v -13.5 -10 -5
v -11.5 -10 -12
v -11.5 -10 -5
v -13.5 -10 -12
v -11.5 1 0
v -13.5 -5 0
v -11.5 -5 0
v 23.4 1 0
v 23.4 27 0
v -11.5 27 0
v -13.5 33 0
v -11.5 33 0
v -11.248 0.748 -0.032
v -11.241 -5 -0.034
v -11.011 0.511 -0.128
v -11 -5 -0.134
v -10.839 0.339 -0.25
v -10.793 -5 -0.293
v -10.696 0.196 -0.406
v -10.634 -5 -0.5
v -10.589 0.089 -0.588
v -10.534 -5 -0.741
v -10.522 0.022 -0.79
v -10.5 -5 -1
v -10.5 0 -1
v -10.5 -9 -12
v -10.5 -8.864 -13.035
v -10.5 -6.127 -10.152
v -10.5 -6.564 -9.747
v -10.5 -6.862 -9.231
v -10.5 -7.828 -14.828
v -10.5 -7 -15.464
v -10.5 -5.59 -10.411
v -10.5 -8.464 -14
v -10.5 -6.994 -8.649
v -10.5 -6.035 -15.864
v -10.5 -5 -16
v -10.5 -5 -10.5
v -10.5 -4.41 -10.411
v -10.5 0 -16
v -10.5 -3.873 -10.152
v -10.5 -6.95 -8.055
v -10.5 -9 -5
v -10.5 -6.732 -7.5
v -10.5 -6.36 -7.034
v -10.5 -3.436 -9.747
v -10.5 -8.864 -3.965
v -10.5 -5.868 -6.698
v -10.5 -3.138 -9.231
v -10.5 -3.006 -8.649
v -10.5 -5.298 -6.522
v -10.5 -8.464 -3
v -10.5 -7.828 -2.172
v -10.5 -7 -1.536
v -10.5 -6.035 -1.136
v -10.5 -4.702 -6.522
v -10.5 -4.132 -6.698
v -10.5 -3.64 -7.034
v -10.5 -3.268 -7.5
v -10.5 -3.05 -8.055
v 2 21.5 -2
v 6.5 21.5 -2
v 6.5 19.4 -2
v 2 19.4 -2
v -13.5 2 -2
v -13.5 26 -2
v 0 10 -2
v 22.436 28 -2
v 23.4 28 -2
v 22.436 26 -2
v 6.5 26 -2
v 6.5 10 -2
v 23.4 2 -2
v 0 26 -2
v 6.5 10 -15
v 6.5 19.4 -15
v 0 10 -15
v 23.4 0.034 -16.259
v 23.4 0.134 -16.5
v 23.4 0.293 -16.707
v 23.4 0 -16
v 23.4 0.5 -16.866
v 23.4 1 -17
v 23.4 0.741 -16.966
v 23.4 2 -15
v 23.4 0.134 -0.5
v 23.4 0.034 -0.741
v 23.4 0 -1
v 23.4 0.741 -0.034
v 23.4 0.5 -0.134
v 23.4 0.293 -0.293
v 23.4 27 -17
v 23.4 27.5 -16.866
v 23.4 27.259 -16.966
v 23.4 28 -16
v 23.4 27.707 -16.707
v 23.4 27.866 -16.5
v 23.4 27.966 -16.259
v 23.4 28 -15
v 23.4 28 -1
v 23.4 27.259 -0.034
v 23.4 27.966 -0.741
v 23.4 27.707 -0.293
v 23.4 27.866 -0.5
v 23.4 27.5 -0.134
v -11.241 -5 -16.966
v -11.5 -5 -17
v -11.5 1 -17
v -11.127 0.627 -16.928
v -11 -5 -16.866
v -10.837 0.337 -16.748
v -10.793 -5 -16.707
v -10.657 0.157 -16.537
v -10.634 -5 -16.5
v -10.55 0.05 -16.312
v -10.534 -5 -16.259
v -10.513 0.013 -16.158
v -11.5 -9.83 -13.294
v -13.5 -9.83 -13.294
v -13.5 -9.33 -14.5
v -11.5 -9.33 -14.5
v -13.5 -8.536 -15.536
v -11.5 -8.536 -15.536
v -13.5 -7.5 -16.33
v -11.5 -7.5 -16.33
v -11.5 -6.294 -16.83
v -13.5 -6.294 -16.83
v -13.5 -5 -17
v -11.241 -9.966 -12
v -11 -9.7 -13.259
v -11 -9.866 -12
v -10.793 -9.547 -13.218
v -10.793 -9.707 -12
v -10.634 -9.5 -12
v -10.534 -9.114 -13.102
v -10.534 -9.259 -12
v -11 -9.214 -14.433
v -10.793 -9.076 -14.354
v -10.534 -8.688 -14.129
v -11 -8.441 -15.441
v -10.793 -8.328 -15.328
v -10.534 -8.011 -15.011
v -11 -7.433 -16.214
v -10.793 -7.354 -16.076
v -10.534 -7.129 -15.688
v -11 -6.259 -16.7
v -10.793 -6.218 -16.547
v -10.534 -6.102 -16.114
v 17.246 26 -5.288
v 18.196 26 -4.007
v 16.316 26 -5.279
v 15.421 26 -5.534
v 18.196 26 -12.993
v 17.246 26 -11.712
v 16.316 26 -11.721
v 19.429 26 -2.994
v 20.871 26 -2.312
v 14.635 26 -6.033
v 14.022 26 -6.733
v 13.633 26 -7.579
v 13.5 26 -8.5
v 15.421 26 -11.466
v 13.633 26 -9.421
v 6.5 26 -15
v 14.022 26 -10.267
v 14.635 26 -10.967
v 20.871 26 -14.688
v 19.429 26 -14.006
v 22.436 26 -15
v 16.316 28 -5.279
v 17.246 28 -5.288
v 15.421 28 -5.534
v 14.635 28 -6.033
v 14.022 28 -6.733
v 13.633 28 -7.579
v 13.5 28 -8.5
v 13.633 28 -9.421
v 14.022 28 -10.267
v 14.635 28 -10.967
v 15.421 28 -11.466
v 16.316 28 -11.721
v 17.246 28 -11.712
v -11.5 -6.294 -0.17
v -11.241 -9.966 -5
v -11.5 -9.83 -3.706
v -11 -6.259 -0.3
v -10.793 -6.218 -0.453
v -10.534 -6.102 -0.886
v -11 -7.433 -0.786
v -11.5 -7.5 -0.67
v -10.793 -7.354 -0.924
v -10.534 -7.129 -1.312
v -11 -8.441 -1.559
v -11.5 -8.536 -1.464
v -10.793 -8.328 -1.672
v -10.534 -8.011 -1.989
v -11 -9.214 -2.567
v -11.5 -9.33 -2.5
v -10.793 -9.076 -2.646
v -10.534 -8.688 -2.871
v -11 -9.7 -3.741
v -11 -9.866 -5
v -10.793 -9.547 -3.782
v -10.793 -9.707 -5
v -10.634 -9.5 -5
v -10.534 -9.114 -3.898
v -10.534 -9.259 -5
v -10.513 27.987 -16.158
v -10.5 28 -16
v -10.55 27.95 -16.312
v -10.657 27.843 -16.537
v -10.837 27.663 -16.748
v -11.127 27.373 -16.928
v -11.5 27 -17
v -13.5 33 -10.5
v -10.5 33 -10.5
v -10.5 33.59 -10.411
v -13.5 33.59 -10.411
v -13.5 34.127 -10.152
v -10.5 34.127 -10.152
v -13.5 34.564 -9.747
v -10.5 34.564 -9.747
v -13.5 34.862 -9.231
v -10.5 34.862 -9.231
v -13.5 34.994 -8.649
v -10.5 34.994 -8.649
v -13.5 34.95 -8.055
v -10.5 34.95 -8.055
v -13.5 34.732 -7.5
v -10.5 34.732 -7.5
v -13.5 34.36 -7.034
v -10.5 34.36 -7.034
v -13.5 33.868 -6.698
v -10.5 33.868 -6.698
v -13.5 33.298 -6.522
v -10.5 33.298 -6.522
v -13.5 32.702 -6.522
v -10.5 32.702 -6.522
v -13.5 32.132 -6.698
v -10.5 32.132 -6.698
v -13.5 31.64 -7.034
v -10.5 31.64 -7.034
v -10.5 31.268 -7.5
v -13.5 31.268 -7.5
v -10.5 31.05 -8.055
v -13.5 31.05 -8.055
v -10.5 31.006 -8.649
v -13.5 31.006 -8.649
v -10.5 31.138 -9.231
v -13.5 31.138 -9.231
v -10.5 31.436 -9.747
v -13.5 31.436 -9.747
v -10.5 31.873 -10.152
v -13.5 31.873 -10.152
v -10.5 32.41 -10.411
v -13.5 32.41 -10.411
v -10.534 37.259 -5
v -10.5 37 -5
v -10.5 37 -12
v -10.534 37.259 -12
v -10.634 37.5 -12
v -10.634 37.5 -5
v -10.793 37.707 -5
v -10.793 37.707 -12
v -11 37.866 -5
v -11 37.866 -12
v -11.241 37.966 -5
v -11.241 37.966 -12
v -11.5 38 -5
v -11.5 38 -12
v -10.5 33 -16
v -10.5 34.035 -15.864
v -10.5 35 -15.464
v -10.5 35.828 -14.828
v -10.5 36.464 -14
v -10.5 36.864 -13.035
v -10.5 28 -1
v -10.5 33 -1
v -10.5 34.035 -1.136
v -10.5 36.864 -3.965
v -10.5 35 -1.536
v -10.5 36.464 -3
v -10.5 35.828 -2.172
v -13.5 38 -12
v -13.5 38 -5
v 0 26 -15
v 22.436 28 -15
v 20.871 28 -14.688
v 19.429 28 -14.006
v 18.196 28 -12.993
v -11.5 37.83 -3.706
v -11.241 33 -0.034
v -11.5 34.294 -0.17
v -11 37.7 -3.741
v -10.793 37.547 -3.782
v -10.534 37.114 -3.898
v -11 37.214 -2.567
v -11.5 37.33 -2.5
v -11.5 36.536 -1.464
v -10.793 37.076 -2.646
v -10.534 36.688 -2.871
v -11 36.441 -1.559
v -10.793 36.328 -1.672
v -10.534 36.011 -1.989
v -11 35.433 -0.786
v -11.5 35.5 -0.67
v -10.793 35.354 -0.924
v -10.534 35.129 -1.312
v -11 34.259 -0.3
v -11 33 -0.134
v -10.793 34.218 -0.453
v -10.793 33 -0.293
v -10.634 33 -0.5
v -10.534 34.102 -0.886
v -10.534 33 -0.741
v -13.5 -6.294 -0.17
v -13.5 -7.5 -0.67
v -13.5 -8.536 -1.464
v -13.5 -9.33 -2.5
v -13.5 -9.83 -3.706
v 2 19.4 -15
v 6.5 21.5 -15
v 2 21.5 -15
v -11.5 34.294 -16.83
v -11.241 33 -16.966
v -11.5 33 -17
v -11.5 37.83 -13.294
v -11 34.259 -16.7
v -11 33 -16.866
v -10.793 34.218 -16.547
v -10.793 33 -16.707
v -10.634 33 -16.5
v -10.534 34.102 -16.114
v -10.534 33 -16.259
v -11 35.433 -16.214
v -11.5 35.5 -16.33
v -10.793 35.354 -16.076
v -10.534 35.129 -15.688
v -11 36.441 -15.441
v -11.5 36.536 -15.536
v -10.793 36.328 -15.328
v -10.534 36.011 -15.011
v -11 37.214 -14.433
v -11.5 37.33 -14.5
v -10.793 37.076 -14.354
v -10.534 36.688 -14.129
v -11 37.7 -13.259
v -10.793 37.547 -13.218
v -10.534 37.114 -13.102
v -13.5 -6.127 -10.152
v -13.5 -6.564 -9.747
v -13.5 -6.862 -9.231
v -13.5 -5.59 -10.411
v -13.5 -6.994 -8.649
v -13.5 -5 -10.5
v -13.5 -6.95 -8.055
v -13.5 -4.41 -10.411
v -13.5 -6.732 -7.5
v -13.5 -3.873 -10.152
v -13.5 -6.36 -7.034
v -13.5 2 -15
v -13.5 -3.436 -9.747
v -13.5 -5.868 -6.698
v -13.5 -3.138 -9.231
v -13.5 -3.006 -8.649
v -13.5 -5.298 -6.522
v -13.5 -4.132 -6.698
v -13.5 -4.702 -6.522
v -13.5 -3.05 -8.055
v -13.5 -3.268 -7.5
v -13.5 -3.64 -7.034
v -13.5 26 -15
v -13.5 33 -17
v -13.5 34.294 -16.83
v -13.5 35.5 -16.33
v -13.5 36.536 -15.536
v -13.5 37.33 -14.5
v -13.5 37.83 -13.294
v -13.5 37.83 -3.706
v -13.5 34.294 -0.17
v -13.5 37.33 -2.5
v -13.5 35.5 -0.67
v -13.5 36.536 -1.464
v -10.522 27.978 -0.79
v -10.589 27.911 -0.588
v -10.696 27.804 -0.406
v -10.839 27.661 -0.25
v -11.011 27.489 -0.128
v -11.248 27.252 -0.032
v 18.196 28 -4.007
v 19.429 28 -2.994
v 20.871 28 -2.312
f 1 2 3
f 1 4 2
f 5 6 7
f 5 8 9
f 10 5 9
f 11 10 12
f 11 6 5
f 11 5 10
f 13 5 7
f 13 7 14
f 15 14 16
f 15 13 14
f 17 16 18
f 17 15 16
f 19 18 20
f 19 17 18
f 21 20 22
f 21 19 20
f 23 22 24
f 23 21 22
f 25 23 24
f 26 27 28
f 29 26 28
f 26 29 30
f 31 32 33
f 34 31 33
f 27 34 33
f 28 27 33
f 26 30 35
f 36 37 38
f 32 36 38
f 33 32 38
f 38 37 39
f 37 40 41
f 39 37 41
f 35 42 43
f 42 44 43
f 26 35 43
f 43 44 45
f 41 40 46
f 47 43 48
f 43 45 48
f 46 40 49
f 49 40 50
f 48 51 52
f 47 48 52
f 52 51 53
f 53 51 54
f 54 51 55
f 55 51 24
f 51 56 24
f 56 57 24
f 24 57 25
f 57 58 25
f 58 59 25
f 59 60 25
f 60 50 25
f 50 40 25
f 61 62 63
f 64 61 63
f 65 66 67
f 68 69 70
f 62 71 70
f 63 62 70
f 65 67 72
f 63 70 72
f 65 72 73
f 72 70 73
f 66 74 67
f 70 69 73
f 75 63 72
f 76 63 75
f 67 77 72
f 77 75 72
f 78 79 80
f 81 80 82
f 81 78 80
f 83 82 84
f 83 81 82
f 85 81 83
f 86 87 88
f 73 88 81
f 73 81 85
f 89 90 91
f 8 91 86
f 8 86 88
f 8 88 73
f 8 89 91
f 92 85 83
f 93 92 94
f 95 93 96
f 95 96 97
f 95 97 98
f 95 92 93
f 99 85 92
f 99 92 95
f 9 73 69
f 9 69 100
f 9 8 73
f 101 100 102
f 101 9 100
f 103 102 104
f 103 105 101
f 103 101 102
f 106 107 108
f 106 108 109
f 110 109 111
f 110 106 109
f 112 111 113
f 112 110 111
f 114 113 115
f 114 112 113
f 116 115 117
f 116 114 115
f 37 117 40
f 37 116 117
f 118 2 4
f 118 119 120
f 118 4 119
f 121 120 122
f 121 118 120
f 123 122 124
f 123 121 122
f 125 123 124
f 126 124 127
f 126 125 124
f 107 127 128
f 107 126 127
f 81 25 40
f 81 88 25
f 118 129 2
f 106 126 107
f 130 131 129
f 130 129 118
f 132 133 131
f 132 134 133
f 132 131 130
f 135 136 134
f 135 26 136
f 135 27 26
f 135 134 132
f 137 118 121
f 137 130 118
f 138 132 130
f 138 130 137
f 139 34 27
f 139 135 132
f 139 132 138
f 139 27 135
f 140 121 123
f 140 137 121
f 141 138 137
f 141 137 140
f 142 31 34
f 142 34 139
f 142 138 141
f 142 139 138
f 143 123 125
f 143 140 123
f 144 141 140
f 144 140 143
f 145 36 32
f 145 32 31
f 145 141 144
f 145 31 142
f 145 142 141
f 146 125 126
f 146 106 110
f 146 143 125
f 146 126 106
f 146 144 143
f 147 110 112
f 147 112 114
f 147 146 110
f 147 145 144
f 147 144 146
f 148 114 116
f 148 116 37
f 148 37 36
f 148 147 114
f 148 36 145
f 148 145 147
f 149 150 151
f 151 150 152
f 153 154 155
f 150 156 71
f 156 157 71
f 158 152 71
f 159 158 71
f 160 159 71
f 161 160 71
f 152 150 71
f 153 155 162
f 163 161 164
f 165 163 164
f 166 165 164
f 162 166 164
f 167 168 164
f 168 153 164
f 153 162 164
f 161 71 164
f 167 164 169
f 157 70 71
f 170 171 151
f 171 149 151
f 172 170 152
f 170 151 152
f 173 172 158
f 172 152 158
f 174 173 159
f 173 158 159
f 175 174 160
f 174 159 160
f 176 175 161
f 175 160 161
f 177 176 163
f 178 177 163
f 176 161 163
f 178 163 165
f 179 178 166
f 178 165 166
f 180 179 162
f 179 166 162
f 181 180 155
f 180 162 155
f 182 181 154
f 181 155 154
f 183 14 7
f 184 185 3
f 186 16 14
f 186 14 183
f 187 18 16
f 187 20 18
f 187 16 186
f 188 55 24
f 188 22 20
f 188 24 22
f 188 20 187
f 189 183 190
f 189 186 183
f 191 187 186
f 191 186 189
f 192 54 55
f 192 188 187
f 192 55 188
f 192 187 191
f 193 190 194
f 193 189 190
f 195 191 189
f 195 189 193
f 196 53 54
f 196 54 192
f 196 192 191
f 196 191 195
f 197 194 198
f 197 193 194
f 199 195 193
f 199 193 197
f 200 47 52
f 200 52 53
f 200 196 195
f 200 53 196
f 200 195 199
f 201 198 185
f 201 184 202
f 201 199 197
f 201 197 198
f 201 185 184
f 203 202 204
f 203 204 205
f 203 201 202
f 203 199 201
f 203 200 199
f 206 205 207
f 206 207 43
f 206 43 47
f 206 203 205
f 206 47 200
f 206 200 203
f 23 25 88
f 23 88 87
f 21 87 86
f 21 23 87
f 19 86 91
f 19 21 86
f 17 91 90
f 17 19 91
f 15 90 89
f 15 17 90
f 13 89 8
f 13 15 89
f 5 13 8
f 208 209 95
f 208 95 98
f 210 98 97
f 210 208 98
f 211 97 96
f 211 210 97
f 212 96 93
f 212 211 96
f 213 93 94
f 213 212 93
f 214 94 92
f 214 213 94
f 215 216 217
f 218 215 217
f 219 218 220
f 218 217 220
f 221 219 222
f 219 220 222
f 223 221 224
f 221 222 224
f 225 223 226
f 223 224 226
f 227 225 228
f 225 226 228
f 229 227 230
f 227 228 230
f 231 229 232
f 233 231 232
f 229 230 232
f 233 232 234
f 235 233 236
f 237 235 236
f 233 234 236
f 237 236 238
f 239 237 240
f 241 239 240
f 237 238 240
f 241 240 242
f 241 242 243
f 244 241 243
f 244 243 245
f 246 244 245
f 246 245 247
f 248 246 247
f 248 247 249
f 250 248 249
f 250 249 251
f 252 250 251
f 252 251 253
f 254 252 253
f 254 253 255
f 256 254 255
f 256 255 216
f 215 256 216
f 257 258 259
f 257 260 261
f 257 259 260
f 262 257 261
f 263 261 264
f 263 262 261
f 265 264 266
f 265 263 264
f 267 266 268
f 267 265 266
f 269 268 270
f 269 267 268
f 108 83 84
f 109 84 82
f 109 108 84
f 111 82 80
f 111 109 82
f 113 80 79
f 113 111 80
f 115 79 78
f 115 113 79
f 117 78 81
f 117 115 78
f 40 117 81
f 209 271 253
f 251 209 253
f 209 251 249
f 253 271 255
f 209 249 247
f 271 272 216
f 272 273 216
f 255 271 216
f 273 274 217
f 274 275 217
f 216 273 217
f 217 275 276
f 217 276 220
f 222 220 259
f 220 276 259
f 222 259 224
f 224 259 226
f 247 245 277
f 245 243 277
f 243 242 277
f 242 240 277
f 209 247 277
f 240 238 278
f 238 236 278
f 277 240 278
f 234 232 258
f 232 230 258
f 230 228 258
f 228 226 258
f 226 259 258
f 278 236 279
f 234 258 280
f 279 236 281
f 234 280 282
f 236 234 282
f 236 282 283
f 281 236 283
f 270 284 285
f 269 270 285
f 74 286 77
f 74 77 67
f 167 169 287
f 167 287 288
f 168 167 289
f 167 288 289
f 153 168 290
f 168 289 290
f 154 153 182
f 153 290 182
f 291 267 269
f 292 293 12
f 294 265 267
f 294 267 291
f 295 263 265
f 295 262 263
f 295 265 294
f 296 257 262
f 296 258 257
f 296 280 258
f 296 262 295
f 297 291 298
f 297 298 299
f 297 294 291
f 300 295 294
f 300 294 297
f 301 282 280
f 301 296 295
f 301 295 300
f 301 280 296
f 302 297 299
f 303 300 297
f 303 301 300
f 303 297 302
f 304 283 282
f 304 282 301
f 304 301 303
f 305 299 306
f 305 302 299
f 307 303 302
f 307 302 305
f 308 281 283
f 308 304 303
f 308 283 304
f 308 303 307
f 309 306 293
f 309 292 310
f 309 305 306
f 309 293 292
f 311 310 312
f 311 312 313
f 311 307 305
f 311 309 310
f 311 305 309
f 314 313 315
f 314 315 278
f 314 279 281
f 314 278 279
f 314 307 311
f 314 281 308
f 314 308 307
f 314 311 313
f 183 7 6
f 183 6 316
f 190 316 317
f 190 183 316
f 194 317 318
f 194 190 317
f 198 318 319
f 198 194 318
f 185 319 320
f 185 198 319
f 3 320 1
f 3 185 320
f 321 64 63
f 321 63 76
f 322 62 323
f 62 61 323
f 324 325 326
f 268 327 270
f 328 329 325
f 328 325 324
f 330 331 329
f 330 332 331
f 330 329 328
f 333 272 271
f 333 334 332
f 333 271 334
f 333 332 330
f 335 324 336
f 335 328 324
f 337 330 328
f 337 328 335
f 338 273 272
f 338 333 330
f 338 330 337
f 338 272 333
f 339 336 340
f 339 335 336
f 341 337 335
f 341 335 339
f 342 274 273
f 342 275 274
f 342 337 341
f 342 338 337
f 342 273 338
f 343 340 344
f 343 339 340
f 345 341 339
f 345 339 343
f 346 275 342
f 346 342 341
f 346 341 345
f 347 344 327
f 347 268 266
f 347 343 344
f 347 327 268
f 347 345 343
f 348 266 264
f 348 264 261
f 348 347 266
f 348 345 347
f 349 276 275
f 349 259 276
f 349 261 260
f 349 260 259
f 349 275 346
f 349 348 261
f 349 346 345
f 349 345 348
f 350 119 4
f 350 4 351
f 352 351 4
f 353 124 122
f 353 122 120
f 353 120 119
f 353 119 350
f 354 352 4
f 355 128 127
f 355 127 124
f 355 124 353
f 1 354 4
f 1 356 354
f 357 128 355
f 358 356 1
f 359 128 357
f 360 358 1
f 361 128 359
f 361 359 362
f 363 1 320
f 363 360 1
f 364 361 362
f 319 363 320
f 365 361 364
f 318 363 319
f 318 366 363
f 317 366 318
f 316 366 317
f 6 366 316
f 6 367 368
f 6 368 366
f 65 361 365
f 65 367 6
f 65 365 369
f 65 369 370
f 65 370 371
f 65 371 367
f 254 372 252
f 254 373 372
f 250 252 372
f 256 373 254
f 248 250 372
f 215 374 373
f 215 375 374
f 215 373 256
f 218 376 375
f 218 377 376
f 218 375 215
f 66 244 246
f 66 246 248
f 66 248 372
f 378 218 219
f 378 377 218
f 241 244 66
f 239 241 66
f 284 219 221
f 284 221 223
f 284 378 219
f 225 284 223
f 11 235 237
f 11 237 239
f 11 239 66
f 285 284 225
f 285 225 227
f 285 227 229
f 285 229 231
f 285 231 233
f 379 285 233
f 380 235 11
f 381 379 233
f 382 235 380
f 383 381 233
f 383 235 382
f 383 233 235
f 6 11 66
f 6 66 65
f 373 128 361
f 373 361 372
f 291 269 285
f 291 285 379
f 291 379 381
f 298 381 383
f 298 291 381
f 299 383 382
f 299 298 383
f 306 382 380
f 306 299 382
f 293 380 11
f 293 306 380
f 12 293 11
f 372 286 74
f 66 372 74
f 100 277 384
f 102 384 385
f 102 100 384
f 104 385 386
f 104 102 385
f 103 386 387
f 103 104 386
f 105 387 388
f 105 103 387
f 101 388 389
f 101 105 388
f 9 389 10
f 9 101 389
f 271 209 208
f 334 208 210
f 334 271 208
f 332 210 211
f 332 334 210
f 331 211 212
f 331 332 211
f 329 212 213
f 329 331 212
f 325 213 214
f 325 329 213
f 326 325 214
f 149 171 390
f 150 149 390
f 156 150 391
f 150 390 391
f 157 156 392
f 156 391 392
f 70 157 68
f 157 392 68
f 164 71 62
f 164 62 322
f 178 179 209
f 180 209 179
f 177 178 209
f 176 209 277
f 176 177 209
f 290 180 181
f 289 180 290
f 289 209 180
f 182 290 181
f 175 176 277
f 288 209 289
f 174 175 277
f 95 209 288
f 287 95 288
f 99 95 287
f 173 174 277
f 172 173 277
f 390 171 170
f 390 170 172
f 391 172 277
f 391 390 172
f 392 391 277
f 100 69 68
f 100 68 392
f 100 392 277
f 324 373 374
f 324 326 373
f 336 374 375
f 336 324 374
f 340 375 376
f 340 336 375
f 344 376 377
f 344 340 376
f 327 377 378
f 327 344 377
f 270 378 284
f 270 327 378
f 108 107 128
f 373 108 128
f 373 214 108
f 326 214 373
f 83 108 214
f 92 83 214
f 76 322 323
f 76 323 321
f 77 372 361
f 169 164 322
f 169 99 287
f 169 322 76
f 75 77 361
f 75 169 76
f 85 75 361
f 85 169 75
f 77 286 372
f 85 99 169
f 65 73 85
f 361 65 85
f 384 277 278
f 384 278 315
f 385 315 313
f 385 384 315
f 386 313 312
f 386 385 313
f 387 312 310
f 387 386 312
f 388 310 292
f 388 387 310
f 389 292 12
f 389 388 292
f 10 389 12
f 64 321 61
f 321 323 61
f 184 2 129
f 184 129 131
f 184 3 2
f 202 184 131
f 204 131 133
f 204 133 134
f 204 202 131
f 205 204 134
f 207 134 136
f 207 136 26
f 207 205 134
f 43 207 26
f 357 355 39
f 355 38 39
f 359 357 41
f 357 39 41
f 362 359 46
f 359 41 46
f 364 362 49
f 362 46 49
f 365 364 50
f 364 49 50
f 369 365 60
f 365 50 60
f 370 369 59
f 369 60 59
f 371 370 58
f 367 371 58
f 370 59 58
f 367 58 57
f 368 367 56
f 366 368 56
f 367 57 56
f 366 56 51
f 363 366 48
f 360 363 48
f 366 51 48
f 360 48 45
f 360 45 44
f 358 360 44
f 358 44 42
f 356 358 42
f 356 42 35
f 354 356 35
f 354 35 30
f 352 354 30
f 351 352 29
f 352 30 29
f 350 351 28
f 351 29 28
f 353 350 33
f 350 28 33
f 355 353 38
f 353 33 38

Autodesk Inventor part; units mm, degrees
ref_plane "YZ Plane" through (0, 0, 0) normal (1, 0, 0) x (0, 1, 0)
ref_plane "XZ Plane" through (0, 0, 0) normal (0, 1, 0) x (-1, 0, 0)
ref_plane "XY Plane" through (0, 0, 0) normal (0, 0, 1) x (1, 0, 0)
sketch "Esquisse5" plane through (0, 0, 0) normal (1, 0, 0) x (0, 1, 0)
  line L0 (0, 0) -> (28, 0)
  line L1 (28, 0) -> (28, -17)
  line L2 (28, -17) -> (0, -17)
  line L3 (0, -17) -> (0, 0)
  line L4 (0, 0) -> (0, -2)
  line L5 (0, -2) -> (2, -2)
  line L6 (28, -17) -> (28, -15)
  line L7 (28, -15) -> (26, -15)
  line L8 (26, -15) -> (2, -15)
  line L9 (2, -15) -> (2, -2)
  line L10 (2, -2) -> (26, -2)
  line L11 (26, -2) -> (26, -15)
  dimension "d20" = 28
  dimension "d21" = 17
  dimension "d22" = 2
  dimension "d23" = 2
  dimension "d24" = 2
  dimension "d25" = 2
extrude "Extrusion4" add sketch "Esquisse5" along normal blind 23.4 contours L0 L1 L7 L11 L10 L5 L3 | L5 L9 L8 L7 L1 L2 L3
sketch "Esquisse6" plane through (0, 0, 0) normal (-1, 0, 0) x (0, 0, 1)
  line L0 (-15, 2) -> (-2, 2) projected
  line L1 (-2, 2) -> (-2, 26) projected
  line L2 (-15, 2) -> (-2, 2)
  line L3 (-2, 2) -> (-2, 26)
  line L4 (-2, 26) -> (-15, 26)
  line L5 (-15, 26) -> (-15, 2)
  point P0 (0, 0)
extrude "Extrusion5" add sketch "Esquisse6" against normal blind 2
sketch "Esquisse7" plane through (2, 0, 0) normal (1, 0, 0) x (0, 0, -1)
  line L0 (15, 2) -> (2, 2)
  line L1 (2, 2) -> (2, 19.4)
  line L2 (2, 2) -> (2, 26)
  line L3 (2, 19.4) -> (2, 21.5)
  line L4 (2, 21.5) -> (2, 26)
  line L5 (2, 21.5) -> (2, 26)
  line L6 (15, 2) -> (2, 2)
  line L7 (2, 2) -> (2, 19.4)
  line L8 (2, 19.4) -> (15, 19.4)
  line L9 (15, 19.4) -> (15, 2)
  line L10 (2, 26) -> (15, 26)
  line L11 (15, 26) -> (2, 26)
  line L12 (2, 26) -> (2, 21.5)
  line L13 (2, 21.5) -> (15, 21.5)
  line L14 (15, 21.5) -> (15, 26)
  point P0 (0, 0)
  dimension "d30" = 17.4
  dimension "d31" = 2.1
extrude "Extrusion6" add sketch "Esquisse7" along normal blind 4.5
sketch "Esquisse8" plane through (6.5, 0, 0) normal (1, 0, 0) x (0, 0, -1)
  line L0 (15, 26) -> (15, 2) projected
  line L1 (2, 2) -> (15, 2)
  line L2 (15, 2) -> (15, 10)
  line L3 (15, 10) -> (2, 10)
  line L4 (2, 10) -> (2, 2)
  point P0 (0, 0)
  dimension "d34" = 8
extrude "Extrusion7" cut sketch "Esquisse8" against normal up to next
sketch "Esquisse9" plane through (0, 28, 0) normal (0, 1, 0) x (1, 0, 0)
  line L0 (22.4357, 15) -> (23.4, 15)
  line L1 (22.4357, 2) -> (23.4, 2)
  arc A0 (23.4, 15) -> (23.4, 2) centre (22.9179, 8.5) ccw
  line L2 (23.4, 2) -> (23.4, 15)
  line L3 (23.4, 15) -> (23.4, 2)
  line L4 (23.4, 2) -> (23.4, 15) projected
  line L5 (23.4, 0) -> (23.4, 2)
  point P0 (0, 0)
extrude "Extrusion8" cut sketch "Esquisse9" against normal blind 4.5 contours L0 L2 L1 A0
sketch "Esquisse10" plane through (6.5, 26, -15) normal (0, -1, 0) x (1, 0, 0)
  line L0 (0, 13) -> (0, 0) projected
  line L1 (0, 6.5) -> (7, 6.5)
  line L2 (7, 6.5) -> (10.25, 6.5)
  circle A0 centre (10.25, 6.5) radius 3.25
  point P0 (-6.5, 15)
  dimension "d39" = 7
  dimension "d41" = 6.5
extrude "Extrusion9" cut sketch "Esquisse10" against normal up to next
sketch "Esquisse11" plane through (0, 0, 0) normal (-1, 0, 0) x (0, 0, 1)
  line L0 (-17, 28) -> (-15, 28) projected
  line L1 (0, 0) -> (-17, 0)
  line L2 (-17, 0) -> (-17, 28)
  line L3 (-17, 28) -> (0, 28)
  line L4 (0, 28) -> (0, 0)
  line L5 (-2, 2) -> (-2, 28) projected
  line L6 (-15, 26) -> (-15, 21.5) projected
  line L7 (-2, 2) -> (-15, 2)
  line L8 (-15, 2) -> (-15, 26)
  line L9 (-15, 26) -> (-2, 26)
  line L10 (-2, 26) -> (-2, 2)
extrude "Extrusion10" add sketch "Esquisse11" along normal blind 13.5
sketch "Esquisse12" plane through (-13.5, 0, 0) normal (-1, 0, 0) x (0, 0, 1)
  line L0 (0, 0) -> (-17, 0)
  line L1 (-17, 0) -> (-17, -10)
  line L2 (-17, -10) -> (0, -10)
  line L3 (0, -10) -> (0, 0)
  line L4 (0, 28) -> (0, 0) projected
  line L5 (0, 28) -> (-17, 28)
  line L6 (-17, 28) -> (-17, 38)
  line L7 (-17, 38) -> (0, 38)
  line L8 (0, 38) -> (0, 28)
  dimension "d46" = 17
  dimension "d47" = 10
  dimension "d50" = 17
  dimension "d51" = 10
extrude "Extrusion11" add sketch "Esquisse12" against normal blind 3
fillet "Congé1" radius 5 1 edges at (-12, 38, -17)
fillet "Congé2" radius 5 3 edges at (-12, 38, 0) (-12, -10, -17) (-12, -10, 0)
sketch "Esquisse13" plane through (-10.5, 0, 0) normal (1, 0, 0) x (0, 0, -1)
  line L0 (5, -10) -> (12, -10) projected
  line L1 (8.5, -10) -> (8.5, -5)
  line L2 (8.5, -5) -> (8.5, 33)
  circle A0 centre (8.5, -5) radius 2
  circle A1 centre (8.5, 33) radius 2
  point P0 (0, 0)
  dimension "d54" = 5
  dimension "d55" = 38
  dimension "d56" = 4
  dimension "d57" = 4
extrude "Extrusion12" cut sketch "Esquisse13" against normal up to next
fillet "Congé3" radius 1 14 edges at (6.45, 28, -17) (6.45, 0, -17) (6.45, 0, 0) (6.45, 28, 0) (-10.5, 36.5355, -15.5355) (-10.5, 38, -8.5) (-10.5, 36.5355, -1.4645) (-10.5, 30.5, 0) (-10.5, 30.5, -17) (-10.5, -8.5355, -15.5355) (-10.5, -10, -8.5) (-10.5, -8.5355, -1.4645) (-10.5, -2.5, 0) (-10.5, -2.5, -17)
properties part number "Support bas servomoteur"
